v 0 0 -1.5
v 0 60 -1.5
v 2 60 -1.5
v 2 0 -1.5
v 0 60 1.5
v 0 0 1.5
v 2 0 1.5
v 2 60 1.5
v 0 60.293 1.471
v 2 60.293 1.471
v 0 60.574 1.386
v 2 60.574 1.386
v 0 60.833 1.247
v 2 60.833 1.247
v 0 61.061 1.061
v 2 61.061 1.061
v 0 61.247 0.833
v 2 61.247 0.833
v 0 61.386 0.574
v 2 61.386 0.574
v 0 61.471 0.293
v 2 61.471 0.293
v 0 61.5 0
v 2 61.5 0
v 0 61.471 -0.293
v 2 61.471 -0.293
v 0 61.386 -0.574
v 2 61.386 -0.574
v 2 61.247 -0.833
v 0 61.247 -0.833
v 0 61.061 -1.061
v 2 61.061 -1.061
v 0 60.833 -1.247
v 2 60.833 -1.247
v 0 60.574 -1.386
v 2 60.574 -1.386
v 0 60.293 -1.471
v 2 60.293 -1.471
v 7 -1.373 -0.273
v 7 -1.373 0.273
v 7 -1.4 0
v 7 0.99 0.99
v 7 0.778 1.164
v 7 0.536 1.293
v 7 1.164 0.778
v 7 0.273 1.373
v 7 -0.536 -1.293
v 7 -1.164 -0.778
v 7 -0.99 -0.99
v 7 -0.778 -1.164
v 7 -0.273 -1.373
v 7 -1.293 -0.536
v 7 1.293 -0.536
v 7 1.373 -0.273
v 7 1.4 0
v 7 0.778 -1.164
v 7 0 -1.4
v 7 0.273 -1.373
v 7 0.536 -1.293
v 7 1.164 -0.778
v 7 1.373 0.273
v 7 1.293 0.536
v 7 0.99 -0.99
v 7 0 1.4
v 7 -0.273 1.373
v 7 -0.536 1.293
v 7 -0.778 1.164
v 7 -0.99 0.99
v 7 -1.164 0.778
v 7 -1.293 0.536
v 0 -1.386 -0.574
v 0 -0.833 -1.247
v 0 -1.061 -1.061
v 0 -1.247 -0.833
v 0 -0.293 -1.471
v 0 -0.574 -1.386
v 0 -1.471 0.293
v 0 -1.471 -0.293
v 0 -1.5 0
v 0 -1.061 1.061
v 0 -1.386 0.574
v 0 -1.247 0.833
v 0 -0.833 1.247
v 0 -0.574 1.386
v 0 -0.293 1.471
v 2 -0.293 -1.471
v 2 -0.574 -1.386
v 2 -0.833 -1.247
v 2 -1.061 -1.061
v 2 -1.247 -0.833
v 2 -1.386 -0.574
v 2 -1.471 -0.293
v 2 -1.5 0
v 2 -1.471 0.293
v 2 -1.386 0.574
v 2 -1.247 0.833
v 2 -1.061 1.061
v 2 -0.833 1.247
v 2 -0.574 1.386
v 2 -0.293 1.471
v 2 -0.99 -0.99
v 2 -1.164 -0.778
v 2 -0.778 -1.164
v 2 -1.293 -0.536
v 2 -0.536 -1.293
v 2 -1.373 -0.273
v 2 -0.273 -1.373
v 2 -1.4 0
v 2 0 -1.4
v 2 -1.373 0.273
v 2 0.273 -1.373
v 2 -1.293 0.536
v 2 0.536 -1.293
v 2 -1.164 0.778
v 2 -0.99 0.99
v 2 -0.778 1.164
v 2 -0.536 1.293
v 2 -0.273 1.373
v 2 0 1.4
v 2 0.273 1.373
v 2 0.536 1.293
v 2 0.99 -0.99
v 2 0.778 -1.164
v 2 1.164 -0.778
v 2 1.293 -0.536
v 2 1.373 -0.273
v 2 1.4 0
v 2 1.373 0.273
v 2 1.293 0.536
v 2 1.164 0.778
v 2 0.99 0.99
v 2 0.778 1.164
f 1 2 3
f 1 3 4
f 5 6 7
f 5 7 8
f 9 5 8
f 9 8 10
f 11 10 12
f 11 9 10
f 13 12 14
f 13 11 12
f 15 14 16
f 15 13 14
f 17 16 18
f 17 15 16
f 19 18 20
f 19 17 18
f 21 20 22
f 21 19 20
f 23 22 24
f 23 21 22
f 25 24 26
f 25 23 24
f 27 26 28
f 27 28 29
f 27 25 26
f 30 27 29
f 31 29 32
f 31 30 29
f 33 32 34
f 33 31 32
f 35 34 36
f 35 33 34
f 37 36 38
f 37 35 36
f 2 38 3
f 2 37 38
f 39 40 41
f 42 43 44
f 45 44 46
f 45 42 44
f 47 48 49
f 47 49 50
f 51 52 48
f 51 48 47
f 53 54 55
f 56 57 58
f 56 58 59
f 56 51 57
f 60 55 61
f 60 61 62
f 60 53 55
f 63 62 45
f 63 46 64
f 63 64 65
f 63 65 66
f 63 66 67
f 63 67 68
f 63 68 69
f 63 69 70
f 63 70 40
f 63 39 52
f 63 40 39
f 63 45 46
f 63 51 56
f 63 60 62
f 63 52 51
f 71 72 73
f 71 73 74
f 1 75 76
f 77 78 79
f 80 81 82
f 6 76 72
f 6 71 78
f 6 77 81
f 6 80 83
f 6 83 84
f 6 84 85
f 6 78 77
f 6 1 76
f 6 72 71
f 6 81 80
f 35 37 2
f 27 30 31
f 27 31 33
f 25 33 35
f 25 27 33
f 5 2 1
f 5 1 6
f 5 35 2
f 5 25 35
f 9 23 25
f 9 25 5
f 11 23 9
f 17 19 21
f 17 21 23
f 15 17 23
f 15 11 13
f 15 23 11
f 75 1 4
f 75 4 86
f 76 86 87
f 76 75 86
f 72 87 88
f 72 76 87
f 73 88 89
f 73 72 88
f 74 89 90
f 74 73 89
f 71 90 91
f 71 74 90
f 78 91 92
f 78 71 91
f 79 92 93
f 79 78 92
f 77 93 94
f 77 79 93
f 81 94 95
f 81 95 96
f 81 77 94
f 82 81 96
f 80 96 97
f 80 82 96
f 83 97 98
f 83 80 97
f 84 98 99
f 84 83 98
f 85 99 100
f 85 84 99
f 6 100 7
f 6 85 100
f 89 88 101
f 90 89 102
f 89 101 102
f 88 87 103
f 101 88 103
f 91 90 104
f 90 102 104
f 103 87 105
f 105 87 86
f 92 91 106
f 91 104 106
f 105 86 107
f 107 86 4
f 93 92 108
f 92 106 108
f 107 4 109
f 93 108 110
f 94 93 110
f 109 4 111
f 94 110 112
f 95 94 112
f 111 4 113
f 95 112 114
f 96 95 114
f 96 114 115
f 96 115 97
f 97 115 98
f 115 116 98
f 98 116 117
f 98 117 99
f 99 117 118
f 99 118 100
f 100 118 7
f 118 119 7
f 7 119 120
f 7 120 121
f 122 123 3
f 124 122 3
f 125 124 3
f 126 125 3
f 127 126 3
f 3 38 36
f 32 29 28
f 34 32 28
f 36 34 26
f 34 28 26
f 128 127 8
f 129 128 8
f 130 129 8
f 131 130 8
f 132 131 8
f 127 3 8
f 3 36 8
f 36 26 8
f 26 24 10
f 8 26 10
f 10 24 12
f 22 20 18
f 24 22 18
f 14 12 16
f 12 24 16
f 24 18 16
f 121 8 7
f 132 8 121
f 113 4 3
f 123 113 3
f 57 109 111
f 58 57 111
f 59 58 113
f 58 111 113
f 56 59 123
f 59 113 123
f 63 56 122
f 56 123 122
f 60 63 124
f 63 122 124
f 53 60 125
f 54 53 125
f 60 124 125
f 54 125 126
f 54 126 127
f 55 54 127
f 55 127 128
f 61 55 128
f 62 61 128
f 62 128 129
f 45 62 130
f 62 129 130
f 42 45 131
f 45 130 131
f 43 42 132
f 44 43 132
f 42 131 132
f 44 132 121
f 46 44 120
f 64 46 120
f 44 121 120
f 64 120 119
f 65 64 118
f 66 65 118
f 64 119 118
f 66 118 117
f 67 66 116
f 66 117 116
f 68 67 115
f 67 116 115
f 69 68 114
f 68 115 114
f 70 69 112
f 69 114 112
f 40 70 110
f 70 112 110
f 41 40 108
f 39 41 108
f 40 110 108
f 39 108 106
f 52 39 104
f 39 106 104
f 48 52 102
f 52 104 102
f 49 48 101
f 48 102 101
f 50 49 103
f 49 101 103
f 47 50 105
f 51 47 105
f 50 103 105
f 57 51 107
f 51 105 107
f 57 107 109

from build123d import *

# Parameters (mm, degrees)
BOSS_EXTRUDE1_DEPTH = 2
SKETCH3_R           = 1.4
BOSS_EXTRUDE3_DEPTH = 5


with BuildPart() as part:
    # Sketch1 → Boss-Extrude1 (new body)
    with BuildSketch(Plane(origin=(0, 0, 0), x_dir=(0, 0, -1), z_dir=(1, 0, 0))):
        with BuildLine():
            Line((-1.5, 0), (-1.5, 60))
            ThreePointArc((-1.5, 60), (0, 61.5), (1.5, 60))
            Line((1.5, 60), (1.5, 0))
            ThreePointArc((1.5, 0), (0, -1.5), (-1.5, 0))
        make_face()
    extrude(amount=BOSS_EXTRUDE1_DEPTH)

    # Sketch3 → Boss-Extrude3 (add)
    with BuildSketch(Plane(origin=(2, 0, 0), x_dir=(0, 0, -1), z_dir=(1, 0, 0))):
        Circle(SKETCH3_R)
    extrude(amount=BOSS_EXTRUDE3_DEPTH)


solid = part.part
